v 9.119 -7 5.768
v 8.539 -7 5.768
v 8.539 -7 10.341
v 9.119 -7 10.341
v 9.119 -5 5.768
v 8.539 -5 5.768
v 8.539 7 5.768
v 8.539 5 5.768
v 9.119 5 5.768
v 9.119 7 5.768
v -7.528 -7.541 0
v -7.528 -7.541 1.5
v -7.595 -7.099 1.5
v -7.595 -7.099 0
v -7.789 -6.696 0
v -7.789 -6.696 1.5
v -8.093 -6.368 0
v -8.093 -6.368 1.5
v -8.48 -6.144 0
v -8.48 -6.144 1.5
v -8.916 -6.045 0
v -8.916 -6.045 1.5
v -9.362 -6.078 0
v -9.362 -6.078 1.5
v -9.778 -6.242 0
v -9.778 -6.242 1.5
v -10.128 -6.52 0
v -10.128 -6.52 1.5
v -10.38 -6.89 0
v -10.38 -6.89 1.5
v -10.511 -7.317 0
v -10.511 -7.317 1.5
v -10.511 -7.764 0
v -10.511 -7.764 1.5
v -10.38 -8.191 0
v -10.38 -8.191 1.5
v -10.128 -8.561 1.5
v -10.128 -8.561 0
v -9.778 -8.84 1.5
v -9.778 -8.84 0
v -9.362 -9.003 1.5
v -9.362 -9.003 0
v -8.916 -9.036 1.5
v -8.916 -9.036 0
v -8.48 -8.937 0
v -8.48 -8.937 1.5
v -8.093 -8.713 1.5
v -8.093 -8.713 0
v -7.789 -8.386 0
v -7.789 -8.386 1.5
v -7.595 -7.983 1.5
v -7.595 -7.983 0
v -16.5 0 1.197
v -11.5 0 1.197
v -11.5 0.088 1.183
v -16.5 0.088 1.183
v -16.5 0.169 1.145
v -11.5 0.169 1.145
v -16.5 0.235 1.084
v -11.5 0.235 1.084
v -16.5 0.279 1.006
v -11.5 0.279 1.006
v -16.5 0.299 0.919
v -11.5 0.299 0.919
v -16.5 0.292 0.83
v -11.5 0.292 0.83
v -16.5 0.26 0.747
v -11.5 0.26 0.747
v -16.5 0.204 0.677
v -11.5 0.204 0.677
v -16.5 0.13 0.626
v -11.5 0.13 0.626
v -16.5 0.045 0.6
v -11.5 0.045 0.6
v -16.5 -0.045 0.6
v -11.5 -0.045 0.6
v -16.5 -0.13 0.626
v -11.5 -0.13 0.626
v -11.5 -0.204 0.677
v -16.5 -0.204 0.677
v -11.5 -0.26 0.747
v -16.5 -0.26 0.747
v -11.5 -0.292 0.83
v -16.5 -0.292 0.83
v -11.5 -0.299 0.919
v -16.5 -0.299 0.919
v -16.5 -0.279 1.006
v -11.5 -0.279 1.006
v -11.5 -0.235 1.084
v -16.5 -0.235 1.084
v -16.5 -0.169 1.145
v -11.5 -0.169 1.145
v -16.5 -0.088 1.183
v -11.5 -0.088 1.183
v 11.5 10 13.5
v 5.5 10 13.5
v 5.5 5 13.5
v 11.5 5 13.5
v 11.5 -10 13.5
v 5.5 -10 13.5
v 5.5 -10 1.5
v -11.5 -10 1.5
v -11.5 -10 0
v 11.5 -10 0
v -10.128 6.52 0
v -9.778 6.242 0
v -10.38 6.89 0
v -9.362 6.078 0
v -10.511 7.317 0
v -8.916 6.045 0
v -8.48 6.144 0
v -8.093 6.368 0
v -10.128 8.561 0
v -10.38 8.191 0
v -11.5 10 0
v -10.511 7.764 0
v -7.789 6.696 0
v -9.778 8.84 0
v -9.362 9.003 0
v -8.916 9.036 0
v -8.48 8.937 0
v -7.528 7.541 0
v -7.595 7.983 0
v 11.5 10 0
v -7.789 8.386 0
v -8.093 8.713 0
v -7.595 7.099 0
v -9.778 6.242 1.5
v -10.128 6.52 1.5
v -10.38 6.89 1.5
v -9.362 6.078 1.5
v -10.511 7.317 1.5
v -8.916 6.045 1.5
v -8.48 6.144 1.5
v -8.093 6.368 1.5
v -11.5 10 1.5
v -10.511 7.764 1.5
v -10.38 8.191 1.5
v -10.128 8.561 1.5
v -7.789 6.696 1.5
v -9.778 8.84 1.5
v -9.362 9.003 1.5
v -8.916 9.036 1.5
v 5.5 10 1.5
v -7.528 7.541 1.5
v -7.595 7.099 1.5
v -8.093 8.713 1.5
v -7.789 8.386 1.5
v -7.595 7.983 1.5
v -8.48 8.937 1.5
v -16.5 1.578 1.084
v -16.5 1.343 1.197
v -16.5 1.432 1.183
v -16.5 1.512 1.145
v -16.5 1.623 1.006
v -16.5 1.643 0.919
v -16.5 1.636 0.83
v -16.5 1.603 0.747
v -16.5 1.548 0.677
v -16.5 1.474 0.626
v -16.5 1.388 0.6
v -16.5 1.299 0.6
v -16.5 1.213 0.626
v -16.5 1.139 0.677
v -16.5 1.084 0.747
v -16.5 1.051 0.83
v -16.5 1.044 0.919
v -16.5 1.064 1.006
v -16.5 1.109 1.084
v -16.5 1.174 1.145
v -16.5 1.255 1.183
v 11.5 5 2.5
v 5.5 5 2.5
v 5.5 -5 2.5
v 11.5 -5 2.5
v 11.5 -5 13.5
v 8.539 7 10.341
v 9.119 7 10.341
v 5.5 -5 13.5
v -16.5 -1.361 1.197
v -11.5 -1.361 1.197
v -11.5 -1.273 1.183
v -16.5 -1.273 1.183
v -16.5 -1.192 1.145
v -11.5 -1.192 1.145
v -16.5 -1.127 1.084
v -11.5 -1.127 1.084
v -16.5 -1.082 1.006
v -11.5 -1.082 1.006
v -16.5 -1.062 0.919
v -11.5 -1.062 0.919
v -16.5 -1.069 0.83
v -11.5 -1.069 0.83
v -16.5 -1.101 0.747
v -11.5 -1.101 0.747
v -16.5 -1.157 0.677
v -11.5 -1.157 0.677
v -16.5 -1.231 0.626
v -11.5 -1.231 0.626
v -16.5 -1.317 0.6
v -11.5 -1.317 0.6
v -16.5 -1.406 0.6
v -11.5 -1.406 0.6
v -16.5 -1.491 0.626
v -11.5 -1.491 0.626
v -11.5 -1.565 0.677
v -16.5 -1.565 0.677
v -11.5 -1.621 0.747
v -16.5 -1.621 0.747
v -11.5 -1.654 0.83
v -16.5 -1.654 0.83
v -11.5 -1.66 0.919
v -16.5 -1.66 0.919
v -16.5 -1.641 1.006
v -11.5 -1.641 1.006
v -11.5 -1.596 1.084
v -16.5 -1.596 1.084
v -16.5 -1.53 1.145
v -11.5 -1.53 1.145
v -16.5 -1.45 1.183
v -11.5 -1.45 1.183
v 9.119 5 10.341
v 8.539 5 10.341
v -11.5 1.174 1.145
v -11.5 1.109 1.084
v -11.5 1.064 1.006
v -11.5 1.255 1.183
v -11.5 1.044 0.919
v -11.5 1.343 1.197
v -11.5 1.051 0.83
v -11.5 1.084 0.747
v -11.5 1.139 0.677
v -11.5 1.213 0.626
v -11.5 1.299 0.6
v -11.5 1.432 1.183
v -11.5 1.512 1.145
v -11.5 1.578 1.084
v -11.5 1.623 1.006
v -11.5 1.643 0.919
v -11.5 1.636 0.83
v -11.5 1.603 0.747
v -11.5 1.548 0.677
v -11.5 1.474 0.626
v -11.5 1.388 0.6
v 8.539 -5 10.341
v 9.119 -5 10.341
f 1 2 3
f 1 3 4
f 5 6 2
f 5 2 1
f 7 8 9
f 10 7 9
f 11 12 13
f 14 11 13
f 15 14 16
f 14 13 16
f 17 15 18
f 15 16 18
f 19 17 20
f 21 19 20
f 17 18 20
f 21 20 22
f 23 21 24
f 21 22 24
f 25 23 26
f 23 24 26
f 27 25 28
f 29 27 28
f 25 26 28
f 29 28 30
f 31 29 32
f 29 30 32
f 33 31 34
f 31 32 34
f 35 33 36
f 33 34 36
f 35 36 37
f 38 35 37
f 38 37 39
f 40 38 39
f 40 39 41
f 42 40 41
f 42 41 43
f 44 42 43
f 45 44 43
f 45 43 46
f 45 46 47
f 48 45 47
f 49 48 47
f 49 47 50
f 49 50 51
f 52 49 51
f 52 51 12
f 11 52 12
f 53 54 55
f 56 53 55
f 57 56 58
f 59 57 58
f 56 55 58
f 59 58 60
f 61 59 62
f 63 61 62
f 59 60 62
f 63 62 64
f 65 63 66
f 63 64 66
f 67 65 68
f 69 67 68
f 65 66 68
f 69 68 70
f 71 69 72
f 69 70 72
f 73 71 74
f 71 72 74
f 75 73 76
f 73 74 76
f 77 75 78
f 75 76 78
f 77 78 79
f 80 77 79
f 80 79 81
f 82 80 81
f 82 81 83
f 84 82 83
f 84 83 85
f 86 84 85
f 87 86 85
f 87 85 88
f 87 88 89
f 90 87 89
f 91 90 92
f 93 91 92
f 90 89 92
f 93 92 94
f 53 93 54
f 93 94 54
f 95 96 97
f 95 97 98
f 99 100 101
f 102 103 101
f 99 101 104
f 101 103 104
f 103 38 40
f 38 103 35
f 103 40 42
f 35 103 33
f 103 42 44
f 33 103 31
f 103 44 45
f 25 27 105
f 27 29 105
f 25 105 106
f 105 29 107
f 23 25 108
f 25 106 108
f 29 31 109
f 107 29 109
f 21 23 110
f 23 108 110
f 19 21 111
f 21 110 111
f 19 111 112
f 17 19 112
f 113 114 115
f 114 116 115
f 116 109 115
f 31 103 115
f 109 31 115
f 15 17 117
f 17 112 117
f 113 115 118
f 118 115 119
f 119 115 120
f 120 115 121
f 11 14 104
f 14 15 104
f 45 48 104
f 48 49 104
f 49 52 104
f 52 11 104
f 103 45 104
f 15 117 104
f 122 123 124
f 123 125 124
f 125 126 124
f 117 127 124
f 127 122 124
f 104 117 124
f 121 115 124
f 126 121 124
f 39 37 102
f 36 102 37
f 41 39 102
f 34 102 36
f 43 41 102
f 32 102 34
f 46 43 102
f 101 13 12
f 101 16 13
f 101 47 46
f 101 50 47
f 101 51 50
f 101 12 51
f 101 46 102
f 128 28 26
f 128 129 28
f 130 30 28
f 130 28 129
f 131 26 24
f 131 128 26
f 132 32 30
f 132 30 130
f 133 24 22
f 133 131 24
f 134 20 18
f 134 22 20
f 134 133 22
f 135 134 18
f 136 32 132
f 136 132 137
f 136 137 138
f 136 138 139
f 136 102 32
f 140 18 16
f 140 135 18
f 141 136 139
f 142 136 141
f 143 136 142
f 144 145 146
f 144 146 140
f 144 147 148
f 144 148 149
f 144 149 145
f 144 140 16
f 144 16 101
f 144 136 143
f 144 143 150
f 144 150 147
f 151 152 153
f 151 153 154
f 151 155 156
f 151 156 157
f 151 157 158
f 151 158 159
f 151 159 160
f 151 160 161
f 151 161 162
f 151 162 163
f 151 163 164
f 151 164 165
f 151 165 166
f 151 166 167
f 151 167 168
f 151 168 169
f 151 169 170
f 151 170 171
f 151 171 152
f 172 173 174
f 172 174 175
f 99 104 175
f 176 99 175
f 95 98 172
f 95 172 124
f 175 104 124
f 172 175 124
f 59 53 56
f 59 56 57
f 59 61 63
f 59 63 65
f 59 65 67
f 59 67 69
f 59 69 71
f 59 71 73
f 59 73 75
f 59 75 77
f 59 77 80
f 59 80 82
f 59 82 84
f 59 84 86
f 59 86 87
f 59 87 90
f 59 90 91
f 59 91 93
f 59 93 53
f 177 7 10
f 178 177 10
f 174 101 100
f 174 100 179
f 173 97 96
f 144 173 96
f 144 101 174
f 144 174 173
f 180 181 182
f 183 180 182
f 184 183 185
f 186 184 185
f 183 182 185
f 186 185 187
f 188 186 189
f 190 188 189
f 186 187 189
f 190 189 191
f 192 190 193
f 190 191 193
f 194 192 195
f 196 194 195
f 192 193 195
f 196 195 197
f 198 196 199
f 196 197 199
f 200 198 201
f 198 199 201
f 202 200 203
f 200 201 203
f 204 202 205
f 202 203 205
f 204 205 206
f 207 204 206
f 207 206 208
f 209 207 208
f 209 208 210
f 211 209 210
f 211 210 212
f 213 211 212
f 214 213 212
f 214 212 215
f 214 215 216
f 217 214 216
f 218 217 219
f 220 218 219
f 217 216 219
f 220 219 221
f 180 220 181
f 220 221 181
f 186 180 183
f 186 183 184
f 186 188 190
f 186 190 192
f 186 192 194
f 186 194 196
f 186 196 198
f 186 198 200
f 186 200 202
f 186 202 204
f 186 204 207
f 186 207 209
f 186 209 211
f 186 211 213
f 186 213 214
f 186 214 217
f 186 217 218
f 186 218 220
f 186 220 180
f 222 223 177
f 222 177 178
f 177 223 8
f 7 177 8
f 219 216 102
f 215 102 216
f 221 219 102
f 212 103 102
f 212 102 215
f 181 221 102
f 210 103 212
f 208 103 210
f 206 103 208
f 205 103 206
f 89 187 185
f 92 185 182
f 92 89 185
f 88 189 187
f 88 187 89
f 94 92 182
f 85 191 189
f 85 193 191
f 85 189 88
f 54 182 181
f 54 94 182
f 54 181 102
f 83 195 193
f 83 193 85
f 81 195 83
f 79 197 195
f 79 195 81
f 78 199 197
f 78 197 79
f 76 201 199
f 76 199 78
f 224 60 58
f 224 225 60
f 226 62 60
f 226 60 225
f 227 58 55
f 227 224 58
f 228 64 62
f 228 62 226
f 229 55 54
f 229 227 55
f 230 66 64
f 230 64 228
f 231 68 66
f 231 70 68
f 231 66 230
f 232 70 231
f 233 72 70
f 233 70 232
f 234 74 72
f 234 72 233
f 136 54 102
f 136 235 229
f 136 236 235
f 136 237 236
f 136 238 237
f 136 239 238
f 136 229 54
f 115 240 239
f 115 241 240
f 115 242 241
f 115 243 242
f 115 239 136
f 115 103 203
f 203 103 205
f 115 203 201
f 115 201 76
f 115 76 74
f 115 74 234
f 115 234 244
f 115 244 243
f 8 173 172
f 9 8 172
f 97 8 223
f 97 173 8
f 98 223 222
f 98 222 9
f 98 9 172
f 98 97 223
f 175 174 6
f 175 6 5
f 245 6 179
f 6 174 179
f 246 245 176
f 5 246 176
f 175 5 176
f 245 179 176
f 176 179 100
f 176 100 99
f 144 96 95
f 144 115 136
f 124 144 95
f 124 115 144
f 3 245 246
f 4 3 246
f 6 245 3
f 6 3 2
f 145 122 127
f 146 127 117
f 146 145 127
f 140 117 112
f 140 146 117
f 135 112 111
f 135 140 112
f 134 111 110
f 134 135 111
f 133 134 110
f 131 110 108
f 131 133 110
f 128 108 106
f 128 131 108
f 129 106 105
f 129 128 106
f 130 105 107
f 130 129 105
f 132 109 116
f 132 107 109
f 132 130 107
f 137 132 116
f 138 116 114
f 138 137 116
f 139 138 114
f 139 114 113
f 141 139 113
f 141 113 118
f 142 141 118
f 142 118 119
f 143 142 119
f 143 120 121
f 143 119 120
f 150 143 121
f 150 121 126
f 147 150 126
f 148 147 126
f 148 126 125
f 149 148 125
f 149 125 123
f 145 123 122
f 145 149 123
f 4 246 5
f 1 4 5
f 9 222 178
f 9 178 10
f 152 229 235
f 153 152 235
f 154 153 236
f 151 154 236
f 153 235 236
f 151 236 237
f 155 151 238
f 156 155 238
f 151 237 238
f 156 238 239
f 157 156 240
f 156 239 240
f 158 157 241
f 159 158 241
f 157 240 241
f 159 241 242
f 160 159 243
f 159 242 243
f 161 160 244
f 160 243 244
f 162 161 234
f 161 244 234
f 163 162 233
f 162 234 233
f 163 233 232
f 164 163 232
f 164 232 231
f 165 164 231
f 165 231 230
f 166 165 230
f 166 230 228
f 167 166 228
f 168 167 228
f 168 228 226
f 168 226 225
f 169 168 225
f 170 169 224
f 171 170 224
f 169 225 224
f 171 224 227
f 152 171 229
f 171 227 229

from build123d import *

# Parameters (mm, degrees)
SKETCH_1_W          = 23
SKETCH_1_H          = 20
EXTRUDE_1_DEPTH     = 1.5
SKETCH_2_W          = 6
SKETCH_2_H          = 20
EXTRUDE_2_DEPTH     = 12
SKETCH_3_W          = 6
SKETCH_3_H          = 10
CUT_EXTRUDE_1_DEPTH = 11
SKETCH_4_R          = 0.3
EXTRUDE_3_DEPTH     = 5
SKETCH_5_R          = 1.5
CUT_EXTRUDE_2_DEPTH = 7
SKETCH_6_W          = 0.579660534
SKETCH_6_H          = 4.573153075
CUT_EXTRUDE_3_DEPTH = 2


with BuildPart() as part:
    # 草图1 → 凸台-拉伸1 (new body)
    with BuildSketch(Plane.XY):
        Rectangle(SKETCH_1_W, SKETCH_1_H)
    extrude(amount=EXTRUDE_1_DEPTH)

    # 草图2 → 凸台-拉伸2 (add)
    with BuildSketch(Plane.XY.offset(1.5)):
        with Locations((8.5, 0)):
            Rectangle(SKETCH_2_W, SKETCH_2_H)
    extrude(amount=EXTRUDE_2_DEPTH)

    # 草图3 → 切除-拉伸1 (cut)
    with BuildSketch(Plane.XY.offset(13.5)):
        with Locations((8.5, 0)):
            Rectangle(SKETCH_3_W, SKETCH_3_H)
    extrude(amount=-CUT_EXTRUDE_1_DEPTH, mode=Mode.SUBTRACT)

    # 草图4 → 凸台-拉伸3 (add)
    with BuildSketch(Plane.ZY.offset(11.5)):
        with Locations((0.896688641, 1.343491603)):
            Circle(SKETCH_4_R)
        with Locations((0.896688641, 0)):
            Circle(SKETCH_4_R)
        with Locations((0.896688641, -1.361244933)):
            Circle(SKETCH_4_R)
    extrude(amount=EXTRUDE_3_DEPTH)

    # 草图5 → 切除-拉伸2 (cut)
    with BuildSketch(Plane.XY.offset(1.5)):
        with Locations((-9.028150669, -7.540646778)):
            Circle(SKETCH_5_R)
    cut_extrude_2 = extrude(amount=-CUT_EXTRUDE_2_DEPTH, mode=Mode.SUBTRACT)

    # 镜向1: 切除-拉伸2 across plane
    add(cut_extrude_2.mirror(Plane.ZX), mode=Mode.SUBTRACT)

    # 草图6 → 切除-拉伸3 (cut)
    with BuildSketch(Plane(origin=(0, -5, 0), x_dir=(1, 0, 0), z_dir=(0, 1, 0))):
        with Locations((8.828789431, -8.054724521)):
            Rectangle(SKETCH_6_W, SKETCH_6_H)
    cut_extrude_3 = extrude(amount=-CUT_EXTRUDE_3_DEPTH, mode=Mode.SUBTRACT)

    # 镜向2: 切除-拉伸3 across plane
    add(cut_extrude_3.mirror(Plane.ZX), mode=Mode.SUBTRACT)


solid = part.part
